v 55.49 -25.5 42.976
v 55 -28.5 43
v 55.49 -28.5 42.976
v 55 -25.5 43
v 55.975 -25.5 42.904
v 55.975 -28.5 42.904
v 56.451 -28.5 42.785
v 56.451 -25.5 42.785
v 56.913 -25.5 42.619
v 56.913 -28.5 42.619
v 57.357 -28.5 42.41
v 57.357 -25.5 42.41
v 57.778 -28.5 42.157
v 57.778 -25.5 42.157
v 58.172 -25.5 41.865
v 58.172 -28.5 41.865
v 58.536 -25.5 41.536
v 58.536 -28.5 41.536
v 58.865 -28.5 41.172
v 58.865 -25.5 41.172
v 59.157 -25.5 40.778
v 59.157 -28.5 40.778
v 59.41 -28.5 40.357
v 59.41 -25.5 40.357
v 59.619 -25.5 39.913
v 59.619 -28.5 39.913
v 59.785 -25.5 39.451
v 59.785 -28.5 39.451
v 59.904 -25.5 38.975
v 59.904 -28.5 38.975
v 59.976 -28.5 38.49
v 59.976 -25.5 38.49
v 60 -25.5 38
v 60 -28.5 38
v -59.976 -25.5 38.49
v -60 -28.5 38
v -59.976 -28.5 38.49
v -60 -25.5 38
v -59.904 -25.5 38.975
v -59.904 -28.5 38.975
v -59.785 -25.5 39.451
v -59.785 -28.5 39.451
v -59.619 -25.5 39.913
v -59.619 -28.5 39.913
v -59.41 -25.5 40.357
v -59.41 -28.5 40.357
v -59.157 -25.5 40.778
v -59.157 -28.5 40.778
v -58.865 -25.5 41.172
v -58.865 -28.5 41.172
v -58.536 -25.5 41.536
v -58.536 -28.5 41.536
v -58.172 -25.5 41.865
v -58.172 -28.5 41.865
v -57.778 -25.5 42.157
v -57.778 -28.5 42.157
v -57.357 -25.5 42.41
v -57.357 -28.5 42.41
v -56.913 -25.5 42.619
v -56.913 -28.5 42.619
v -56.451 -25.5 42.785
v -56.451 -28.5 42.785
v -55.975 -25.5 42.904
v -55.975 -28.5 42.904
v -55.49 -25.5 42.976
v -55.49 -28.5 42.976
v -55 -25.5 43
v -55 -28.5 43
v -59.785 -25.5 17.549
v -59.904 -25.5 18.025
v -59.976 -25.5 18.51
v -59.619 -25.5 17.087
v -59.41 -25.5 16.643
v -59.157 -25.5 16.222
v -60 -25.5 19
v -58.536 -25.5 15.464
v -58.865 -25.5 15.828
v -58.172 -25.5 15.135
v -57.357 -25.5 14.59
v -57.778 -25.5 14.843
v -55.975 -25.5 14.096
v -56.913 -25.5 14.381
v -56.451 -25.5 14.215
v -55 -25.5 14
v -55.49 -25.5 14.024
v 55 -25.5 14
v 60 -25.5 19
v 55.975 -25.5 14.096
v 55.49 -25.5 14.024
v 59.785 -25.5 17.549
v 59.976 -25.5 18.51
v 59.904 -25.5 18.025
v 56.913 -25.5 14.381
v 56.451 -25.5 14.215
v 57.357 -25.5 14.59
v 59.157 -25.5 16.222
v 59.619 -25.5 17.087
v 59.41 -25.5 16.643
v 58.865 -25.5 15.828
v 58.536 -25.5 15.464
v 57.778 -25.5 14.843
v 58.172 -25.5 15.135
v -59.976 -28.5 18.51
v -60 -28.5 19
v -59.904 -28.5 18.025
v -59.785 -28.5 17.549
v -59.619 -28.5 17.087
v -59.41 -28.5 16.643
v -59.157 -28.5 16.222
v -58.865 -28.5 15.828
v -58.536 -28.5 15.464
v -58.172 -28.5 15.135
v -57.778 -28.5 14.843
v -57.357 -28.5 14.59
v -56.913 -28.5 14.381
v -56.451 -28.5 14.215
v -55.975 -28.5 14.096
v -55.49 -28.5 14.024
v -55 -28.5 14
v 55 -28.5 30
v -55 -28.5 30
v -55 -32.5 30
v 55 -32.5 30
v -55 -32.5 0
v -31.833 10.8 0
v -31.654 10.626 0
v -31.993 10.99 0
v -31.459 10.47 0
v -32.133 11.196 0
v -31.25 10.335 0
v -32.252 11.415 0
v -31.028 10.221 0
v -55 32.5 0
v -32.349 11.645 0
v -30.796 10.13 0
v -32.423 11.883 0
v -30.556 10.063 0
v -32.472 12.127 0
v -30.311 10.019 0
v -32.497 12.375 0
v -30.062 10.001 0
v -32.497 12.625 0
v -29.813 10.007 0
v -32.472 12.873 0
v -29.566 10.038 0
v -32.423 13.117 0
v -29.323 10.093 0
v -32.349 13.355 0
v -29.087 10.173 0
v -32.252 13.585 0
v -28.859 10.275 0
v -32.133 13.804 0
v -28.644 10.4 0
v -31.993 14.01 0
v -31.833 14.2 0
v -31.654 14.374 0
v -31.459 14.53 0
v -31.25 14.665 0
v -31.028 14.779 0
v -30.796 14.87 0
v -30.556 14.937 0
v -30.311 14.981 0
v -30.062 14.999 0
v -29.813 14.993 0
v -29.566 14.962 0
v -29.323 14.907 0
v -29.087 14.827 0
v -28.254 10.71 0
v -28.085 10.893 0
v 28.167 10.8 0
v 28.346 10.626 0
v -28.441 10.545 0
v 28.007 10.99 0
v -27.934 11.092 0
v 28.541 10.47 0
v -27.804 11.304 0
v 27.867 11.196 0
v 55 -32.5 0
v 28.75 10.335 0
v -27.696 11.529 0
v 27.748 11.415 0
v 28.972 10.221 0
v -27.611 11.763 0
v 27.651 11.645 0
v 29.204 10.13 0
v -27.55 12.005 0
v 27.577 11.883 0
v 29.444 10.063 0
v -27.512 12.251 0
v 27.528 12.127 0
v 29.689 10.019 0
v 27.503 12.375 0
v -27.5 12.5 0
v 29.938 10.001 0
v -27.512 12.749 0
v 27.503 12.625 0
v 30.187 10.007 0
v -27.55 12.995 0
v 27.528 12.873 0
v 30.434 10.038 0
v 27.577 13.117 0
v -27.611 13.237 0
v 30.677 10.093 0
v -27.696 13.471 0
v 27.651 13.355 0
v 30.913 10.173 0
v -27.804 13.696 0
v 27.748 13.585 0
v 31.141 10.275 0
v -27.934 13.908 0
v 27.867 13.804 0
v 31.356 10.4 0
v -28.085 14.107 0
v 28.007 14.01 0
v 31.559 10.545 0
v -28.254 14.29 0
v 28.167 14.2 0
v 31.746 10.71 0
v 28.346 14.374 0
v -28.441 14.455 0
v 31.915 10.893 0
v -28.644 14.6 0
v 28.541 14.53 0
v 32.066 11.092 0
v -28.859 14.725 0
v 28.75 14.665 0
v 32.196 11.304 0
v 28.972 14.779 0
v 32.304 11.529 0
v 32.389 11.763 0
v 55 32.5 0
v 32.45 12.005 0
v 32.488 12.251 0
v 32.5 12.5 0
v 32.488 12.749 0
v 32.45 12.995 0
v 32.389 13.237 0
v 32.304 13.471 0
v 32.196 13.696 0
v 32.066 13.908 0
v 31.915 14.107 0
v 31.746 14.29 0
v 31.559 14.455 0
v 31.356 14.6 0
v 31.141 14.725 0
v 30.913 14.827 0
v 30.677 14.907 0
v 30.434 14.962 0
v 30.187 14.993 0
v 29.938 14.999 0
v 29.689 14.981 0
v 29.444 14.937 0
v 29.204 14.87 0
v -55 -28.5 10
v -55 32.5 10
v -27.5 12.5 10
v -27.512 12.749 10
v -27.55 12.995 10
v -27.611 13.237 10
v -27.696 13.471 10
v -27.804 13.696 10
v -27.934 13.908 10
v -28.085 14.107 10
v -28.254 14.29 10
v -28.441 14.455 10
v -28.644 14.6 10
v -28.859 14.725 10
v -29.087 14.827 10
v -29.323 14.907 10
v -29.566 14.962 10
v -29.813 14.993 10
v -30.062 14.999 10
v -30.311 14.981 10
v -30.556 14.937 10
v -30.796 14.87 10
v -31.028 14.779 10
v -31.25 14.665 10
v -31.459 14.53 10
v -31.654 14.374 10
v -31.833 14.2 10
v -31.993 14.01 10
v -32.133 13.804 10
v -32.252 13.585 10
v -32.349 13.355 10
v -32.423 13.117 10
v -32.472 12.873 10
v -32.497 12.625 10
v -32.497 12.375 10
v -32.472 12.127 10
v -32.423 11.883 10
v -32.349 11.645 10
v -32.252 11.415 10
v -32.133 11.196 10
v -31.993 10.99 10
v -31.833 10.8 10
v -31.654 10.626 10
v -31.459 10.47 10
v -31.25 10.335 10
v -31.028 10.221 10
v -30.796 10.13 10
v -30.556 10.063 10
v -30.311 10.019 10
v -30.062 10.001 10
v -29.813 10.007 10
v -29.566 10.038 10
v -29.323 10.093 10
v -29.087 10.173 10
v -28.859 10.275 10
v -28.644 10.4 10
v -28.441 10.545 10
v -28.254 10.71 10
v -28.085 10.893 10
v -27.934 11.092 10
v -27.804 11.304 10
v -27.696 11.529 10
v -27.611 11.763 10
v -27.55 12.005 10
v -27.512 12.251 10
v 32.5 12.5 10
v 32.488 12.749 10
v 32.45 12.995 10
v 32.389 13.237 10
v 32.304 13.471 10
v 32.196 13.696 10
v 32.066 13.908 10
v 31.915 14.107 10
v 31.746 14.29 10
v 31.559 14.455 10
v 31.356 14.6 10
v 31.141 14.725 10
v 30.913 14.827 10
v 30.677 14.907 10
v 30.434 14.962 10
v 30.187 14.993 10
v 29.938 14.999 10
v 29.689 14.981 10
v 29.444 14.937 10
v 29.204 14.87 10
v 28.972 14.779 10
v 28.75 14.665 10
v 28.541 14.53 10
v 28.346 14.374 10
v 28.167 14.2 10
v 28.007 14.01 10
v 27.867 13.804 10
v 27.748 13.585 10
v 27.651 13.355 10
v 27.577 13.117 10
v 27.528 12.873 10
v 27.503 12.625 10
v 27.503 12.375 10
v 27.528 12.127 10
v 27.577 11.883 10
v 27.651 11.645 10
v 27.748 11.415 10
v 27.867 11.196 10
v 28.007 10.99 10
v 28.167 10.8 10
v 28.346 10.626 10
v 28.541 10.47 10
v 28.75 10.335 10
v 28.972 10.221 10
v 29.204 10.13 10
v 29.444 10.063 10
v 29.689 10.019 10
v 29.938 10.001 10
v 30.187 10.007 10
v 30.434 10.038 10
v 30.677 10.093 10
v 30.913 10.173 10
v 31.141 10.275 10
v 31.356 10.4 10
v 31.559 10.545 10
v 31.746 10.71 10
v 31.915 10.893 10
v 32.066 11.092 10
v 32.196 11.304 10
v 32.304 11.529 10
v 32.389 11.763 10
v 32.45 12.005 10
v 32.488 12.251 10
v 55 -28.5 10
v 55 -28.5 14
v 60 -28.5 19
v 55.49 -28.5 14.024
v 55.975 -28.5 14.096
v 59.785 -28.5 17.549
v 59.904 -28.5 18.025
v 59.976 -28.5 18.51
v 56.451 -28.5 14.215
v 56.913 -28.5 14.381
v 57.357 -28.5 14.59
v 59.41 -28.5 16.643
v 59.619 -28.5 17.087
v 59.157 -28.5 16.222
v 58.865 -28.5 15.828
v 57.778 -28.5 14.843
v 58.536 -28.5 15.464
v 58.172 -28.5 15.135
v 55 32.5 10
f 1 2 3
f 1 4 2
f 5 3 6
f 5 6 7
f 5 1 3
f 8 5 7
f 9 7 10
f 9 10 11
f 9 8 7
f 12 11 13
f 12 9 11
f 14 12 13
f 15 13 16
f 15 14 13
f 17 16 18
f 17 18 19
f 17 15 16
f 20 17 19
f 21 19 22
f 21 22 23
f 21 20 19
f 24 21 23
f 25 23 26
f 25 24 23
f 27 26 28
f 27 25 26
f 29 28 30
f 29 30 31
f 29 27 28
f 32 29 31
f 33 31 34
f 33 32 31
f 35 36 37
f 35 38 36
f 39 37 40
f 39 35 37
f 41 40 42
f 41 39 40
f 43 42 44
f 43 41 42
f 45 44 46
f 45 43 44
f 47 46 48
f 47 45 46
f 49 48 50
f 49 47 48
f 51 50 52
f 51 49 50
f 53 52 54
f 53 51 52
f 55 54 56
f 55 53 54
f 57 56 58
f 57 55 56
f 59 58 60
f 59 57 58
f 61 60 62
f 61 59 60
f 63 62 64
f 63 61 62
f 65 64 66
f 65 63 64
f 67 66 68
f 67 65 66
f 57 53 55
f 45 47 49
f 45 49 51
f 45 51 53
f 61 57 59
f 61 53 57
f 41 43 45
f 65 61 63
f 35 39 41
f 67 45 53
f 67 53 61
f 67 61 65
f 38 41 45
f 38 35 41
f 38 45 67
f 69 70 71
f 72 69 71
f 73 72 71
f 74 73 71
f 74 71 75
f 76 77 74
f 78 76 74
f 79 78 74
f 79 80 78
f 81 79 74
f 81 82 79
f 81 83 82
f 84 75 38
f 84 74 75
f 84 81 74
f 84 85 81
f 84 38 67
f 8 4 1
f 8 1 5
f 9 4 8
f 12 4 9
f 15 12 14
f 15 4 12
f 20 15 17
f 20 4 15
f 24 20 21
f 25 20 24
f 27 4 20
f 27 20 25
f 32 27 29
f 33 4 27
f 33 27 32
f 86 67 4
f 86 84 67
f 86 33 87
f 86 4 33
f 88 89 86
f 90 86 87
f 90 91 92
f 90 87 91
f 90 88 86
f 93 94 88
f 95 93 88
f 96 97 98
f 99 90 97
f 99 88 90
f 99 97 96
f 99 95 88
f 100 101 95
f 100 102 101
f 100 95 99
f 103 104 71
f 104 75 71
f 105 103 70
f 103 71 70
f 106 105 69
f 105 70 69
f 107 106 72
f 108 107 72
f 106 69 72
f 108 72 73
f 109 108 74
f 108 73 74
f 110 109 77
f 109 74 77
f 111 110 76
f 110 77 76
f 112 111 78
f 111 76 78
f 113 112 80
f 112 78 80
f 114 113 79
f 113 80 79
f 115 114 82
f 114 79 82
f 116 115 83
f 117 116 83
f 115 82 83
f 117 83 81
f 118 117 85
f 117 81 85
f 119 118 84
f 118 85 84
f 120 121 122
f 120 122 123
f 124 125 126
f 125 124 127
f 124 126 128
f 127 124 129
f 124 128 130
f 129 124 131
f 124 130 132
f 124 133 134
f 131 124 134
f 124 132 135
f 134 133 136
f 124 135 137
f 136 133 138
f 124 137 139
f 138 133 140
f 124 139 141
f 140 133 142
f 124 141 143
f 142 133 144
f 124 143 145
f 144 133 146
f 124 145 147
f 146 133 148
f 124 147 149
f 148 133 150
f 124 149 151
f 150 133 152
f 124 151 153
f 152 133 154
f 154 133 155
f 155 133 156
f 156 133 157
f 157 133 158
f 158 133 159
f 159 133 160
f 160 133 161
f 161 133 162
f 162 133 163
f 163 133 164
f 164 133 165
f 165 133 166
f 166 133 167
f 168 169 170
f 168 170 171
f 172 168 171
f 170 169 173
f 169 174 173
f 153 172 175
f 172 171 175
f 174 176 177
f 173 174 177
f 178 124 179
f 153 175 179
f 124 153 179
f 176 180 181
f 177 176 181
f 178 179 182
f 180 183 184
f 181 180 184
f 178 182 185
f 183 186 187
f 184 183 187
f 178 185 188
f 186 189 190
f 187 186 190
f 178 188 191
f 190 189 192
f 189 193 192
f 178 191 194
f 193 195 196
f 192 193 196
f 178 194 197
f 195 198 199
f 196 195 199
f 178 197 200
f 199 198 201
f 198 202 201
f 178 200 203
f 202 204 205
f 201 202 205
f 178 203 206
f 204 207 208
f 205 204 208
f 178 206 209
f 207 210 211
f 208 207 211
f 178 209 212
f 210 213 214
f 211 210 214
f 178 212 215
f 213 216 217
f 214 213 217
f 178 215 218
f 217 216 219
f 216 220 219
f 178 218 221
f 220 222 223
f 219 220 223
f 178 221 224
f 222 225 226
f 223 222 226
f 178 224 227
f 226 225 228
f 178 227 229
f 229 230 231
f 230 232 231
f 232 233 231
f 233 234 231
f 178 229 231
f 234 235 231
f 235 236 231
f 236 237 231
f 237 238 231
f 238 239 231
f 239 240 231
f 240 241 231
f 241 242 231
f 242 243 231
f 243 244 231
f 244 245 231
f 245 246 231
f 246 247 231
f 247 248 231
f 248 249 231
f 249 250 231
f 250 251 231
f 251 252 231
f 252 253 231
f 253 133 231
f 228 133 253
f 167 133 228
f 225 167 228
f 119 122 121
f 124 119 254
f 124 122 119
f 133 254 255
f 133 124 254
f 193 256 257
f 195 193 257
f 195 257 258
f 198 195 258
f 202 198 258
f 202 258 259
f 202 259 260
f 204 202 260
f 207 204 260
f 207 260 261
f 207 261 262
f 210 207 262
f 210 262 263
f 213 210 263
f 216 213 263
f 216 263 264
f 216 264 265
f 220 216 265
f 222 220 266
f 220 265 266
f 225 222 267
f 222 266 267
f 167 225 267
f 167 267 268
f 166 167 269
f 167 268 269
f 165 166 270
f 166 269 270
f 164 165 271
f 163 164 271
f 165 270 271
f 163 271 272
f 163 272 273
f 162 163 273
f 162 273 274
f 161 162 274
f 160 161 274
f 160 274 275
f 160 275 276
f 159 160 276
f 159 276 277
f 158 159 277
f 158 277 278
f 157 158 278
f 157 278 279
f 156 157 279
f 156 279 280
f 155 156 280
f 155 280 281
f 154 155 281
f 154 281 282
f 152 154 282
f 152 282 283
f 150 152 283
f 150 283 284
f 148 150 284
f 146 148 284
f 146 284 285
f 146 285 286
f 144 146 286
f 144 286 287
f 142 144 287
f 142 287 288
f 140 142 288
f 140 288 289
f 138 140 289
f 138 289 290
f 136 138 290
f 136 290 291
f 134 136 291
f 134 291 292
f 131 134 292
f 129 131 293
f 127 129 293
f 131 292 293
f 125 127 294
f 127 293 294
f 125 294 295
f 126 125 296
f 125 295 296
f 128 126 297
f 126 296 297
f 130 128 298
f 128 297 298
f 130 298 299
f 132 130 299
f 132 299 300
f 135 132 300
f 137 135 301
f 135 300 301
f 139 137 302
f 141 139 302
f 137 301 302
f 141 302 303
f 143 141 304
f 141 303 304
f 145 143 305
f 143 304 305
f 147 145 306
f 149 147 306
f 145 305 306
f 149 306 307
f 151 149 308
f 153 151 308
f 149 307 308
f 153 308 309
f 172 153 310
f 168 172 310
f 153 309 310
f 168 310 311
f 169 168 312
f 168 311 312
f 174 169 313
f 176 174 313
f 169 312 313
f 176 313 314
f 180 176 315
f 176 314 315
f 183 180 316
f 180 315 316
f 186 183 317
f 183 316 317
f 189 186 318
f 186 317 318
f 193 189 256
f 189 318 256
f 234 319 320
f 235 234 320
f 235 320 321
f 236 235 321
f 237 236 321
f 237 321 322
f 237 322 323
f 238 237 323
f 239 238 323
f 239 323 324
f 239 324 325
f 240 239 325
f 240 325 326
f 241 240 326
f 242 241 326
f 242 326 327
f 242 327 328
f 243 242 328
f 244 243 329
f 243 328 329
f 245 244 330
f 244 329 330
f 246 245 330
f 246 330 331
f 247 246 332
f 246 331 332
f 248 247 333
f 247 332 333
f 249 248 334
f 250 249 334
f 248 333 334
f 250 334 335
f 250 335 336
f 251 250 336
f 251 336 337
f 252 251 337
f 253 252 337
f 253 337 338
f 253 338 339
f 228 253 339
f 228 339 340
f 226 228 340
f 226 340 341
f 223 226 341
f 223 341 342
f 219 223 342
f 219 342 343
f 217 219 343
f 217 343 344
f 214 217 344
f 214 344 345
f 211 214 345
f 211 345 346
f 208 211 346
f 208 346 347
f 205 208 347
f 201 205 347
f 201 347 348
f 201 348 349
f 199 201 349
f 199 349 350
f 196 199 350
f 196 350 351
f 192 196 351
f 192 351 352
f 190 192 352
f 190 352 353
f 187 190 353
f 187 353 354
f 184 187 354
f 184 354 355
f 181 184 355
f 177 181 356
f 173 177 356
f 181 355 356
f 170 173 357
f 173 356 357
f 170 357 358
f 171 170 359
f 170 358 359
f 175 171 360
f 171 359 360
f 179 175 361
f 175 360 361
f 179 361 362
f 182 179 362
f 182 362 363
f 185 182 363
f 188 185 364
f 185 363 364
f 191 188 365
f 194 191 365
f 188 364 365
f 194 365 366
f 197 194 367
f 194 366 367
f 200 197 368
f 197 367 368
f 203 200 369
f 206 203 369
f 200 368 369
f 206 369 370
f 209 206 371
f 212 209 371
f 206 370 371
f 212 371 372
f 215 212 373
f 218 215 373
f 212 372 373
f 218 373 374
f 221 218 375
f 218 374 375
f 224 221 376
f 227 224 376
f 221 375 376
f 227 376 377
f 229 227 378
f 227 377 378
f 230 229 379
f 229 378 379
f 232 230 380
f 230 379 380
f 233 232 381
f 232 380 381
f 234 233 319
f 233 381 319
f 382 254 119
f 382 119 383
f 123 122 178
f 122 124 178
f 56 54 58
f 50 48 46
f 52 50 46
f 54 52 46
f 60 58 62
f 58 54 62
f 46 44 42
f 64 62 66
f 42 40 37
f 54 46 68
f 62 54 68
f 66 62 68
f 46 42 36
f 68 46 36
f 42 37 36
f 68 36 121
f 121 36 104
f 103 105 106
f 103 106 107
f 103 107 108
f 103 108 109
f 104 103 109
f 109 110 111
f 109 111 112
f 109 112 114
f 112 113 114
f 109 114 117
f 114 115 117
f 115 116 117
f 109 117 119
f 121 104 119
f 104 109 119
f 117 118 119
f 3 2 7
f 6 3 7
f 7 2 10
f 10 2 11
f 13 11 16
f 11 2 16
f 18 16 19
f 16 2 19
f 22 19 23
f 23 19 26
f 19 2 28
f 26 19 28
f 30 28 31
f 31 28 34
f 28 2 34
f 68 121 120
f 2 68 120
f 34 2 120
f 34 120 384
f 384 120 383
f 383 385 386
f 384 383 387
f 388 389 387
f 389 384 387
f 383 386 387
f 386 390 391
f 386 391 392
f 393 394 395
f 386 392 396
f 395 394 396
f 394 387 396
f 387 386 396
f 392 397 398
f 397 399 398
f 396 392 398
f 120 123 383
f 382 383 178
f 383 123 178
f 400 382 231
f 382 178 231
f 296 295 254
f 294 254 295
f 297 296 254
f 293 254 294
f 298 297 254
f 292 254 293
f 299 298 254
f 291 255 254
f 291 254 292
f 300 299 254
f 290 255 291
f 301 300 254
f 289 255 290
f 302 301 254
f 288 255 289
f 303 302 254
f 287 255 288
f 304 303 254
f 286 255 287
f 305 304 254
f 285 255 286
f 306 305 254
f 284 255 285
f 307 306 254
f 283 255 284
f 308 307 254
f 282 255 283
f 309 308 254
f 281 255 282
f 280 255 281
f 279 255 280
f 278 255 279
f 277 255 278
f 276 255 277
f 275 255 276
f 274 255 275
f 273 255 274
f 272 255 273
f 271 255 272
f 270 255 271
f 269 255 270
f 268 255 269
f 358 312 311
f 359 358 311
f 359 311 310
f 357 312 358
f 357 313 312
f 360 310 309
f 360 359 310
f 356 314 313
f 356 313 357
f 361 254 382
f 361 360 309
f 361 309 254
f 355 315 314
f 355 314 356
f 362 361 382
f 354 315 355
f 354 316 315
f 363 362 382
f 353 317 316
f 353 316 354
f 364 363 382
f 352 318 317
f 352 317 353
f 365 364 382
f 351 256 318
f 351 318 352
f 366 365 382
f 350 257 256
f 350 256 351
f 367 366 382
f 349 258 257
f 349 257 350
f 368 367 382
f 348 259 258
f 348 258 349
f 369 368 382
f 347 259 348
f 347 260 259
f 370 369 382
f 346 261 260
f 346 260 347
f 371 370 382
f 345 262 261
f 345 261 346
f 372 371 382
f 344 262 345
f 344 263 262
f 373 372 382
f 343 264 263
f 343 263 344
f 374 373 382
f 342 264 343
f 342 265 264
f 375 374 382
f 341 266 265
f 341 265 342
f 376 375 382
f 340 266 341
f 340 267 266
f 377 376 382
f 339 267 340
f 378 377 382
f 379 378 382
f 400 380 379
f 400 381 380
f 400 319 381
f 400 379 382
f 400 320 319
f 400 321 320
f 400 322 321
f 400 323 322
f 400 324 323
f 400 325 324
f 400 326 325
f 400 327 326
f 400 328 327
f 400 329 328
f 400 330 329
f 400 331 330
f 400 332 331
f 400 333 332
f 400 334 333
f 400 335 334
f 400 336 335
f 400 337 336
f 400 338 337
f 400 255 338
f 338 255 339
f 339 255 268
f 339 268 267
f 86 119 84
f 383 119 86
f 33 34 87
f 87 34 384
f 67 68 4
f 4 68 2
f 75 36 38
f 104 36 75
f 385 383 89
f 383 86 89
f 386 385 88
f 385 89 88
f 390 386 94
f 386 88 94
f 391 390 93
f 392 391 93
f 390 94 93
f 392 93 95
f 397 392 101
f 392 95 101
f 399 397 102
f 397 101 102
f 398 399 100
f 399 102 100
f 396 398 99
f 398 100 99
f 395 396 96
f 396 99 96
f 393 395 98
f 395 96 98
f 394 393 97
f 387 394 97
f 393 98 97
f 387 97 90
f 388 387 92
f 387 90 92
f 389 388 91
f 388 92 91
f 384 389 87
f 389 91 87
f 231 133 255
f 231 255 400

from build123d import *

# Parameters (mm, degrees)
ESQUISSE1_W             = 110
ESQUISSE1_H             = 65
BOSS_EXTRU_1_DEPTH      = 10
ESQUISSE2_W             = 110
ESQUISSE2_H             = 4
BOSS_EXTRU_2_DEPTH      = 20
ESQUISSE3_W             = 120
ESQUISSE3_H             = 29
BOSS_EXTRU_3_DEPTH      = 3
CONG_1_R                = 5
ESQUISSE4_R             = 2.5
ENL_V_MAT_EXTRU_1_DEPTH = 76.797427397


with BuildPart() as part:
    # Esquisse1 → Boss.-Extru.1 (new body)
    with BuildSketch(Plane.XY):
        Rectangle(ESQUISSE1_W, ESQUISSE1_H)
    extrude(amount=BOSS_EXTRU_1_DEPTH)

    # Esquisse2 → Boss.-Extru.2 (add)
    with BuildSketch(Plane.XY.offset(10)):
        with Locations((0, -30.5)):
            Rectangle(ESQUISSE2_W, ESQUISSE2_H)
    extrude(amount=BOSS_EXTRU_2_DEPTH)

    # Esquisse3 → Boss.-Extru.3 (add)
    with BuildSketch(Plane(origin=(0, -28.5, 0), x_dir=(1, 0, 0), z_dir=(0, 1, 0))):
        with Locations((0, -28.5)):
            Rectangle(ESQUISSE3_W, ESQUISSE3_H)
    extrude(amount=BOSS_EXTRU_3_DEPTH)

    # Congé1
    cong_1_edges = [part.edges().sort_by_distance(p)[0] for p in [
        (60, -27, 14),
        (60, -27, 43),
        (-60, -27, 43),
        (-60, -27, 14),
    ]]
    fillet(cong_1_edges, radius=CONG_1_R)

    # Esquisse4 → Enlèv. mat.-Extru.1 (cut, through all)
    with BuildSketch(Plane.XY.offset(10)):
        with Locations((-30, 12.5)):
            Circle(ESQUISSE4_R)
        with Locations((30, 12.5)):
            Circle(ESQUISSE4_R)
    extrude(amount=-ENL_V_MAT_EXTRU_1_DEPTH, mode=Mode.SUBTRACT)


solid = part.part
